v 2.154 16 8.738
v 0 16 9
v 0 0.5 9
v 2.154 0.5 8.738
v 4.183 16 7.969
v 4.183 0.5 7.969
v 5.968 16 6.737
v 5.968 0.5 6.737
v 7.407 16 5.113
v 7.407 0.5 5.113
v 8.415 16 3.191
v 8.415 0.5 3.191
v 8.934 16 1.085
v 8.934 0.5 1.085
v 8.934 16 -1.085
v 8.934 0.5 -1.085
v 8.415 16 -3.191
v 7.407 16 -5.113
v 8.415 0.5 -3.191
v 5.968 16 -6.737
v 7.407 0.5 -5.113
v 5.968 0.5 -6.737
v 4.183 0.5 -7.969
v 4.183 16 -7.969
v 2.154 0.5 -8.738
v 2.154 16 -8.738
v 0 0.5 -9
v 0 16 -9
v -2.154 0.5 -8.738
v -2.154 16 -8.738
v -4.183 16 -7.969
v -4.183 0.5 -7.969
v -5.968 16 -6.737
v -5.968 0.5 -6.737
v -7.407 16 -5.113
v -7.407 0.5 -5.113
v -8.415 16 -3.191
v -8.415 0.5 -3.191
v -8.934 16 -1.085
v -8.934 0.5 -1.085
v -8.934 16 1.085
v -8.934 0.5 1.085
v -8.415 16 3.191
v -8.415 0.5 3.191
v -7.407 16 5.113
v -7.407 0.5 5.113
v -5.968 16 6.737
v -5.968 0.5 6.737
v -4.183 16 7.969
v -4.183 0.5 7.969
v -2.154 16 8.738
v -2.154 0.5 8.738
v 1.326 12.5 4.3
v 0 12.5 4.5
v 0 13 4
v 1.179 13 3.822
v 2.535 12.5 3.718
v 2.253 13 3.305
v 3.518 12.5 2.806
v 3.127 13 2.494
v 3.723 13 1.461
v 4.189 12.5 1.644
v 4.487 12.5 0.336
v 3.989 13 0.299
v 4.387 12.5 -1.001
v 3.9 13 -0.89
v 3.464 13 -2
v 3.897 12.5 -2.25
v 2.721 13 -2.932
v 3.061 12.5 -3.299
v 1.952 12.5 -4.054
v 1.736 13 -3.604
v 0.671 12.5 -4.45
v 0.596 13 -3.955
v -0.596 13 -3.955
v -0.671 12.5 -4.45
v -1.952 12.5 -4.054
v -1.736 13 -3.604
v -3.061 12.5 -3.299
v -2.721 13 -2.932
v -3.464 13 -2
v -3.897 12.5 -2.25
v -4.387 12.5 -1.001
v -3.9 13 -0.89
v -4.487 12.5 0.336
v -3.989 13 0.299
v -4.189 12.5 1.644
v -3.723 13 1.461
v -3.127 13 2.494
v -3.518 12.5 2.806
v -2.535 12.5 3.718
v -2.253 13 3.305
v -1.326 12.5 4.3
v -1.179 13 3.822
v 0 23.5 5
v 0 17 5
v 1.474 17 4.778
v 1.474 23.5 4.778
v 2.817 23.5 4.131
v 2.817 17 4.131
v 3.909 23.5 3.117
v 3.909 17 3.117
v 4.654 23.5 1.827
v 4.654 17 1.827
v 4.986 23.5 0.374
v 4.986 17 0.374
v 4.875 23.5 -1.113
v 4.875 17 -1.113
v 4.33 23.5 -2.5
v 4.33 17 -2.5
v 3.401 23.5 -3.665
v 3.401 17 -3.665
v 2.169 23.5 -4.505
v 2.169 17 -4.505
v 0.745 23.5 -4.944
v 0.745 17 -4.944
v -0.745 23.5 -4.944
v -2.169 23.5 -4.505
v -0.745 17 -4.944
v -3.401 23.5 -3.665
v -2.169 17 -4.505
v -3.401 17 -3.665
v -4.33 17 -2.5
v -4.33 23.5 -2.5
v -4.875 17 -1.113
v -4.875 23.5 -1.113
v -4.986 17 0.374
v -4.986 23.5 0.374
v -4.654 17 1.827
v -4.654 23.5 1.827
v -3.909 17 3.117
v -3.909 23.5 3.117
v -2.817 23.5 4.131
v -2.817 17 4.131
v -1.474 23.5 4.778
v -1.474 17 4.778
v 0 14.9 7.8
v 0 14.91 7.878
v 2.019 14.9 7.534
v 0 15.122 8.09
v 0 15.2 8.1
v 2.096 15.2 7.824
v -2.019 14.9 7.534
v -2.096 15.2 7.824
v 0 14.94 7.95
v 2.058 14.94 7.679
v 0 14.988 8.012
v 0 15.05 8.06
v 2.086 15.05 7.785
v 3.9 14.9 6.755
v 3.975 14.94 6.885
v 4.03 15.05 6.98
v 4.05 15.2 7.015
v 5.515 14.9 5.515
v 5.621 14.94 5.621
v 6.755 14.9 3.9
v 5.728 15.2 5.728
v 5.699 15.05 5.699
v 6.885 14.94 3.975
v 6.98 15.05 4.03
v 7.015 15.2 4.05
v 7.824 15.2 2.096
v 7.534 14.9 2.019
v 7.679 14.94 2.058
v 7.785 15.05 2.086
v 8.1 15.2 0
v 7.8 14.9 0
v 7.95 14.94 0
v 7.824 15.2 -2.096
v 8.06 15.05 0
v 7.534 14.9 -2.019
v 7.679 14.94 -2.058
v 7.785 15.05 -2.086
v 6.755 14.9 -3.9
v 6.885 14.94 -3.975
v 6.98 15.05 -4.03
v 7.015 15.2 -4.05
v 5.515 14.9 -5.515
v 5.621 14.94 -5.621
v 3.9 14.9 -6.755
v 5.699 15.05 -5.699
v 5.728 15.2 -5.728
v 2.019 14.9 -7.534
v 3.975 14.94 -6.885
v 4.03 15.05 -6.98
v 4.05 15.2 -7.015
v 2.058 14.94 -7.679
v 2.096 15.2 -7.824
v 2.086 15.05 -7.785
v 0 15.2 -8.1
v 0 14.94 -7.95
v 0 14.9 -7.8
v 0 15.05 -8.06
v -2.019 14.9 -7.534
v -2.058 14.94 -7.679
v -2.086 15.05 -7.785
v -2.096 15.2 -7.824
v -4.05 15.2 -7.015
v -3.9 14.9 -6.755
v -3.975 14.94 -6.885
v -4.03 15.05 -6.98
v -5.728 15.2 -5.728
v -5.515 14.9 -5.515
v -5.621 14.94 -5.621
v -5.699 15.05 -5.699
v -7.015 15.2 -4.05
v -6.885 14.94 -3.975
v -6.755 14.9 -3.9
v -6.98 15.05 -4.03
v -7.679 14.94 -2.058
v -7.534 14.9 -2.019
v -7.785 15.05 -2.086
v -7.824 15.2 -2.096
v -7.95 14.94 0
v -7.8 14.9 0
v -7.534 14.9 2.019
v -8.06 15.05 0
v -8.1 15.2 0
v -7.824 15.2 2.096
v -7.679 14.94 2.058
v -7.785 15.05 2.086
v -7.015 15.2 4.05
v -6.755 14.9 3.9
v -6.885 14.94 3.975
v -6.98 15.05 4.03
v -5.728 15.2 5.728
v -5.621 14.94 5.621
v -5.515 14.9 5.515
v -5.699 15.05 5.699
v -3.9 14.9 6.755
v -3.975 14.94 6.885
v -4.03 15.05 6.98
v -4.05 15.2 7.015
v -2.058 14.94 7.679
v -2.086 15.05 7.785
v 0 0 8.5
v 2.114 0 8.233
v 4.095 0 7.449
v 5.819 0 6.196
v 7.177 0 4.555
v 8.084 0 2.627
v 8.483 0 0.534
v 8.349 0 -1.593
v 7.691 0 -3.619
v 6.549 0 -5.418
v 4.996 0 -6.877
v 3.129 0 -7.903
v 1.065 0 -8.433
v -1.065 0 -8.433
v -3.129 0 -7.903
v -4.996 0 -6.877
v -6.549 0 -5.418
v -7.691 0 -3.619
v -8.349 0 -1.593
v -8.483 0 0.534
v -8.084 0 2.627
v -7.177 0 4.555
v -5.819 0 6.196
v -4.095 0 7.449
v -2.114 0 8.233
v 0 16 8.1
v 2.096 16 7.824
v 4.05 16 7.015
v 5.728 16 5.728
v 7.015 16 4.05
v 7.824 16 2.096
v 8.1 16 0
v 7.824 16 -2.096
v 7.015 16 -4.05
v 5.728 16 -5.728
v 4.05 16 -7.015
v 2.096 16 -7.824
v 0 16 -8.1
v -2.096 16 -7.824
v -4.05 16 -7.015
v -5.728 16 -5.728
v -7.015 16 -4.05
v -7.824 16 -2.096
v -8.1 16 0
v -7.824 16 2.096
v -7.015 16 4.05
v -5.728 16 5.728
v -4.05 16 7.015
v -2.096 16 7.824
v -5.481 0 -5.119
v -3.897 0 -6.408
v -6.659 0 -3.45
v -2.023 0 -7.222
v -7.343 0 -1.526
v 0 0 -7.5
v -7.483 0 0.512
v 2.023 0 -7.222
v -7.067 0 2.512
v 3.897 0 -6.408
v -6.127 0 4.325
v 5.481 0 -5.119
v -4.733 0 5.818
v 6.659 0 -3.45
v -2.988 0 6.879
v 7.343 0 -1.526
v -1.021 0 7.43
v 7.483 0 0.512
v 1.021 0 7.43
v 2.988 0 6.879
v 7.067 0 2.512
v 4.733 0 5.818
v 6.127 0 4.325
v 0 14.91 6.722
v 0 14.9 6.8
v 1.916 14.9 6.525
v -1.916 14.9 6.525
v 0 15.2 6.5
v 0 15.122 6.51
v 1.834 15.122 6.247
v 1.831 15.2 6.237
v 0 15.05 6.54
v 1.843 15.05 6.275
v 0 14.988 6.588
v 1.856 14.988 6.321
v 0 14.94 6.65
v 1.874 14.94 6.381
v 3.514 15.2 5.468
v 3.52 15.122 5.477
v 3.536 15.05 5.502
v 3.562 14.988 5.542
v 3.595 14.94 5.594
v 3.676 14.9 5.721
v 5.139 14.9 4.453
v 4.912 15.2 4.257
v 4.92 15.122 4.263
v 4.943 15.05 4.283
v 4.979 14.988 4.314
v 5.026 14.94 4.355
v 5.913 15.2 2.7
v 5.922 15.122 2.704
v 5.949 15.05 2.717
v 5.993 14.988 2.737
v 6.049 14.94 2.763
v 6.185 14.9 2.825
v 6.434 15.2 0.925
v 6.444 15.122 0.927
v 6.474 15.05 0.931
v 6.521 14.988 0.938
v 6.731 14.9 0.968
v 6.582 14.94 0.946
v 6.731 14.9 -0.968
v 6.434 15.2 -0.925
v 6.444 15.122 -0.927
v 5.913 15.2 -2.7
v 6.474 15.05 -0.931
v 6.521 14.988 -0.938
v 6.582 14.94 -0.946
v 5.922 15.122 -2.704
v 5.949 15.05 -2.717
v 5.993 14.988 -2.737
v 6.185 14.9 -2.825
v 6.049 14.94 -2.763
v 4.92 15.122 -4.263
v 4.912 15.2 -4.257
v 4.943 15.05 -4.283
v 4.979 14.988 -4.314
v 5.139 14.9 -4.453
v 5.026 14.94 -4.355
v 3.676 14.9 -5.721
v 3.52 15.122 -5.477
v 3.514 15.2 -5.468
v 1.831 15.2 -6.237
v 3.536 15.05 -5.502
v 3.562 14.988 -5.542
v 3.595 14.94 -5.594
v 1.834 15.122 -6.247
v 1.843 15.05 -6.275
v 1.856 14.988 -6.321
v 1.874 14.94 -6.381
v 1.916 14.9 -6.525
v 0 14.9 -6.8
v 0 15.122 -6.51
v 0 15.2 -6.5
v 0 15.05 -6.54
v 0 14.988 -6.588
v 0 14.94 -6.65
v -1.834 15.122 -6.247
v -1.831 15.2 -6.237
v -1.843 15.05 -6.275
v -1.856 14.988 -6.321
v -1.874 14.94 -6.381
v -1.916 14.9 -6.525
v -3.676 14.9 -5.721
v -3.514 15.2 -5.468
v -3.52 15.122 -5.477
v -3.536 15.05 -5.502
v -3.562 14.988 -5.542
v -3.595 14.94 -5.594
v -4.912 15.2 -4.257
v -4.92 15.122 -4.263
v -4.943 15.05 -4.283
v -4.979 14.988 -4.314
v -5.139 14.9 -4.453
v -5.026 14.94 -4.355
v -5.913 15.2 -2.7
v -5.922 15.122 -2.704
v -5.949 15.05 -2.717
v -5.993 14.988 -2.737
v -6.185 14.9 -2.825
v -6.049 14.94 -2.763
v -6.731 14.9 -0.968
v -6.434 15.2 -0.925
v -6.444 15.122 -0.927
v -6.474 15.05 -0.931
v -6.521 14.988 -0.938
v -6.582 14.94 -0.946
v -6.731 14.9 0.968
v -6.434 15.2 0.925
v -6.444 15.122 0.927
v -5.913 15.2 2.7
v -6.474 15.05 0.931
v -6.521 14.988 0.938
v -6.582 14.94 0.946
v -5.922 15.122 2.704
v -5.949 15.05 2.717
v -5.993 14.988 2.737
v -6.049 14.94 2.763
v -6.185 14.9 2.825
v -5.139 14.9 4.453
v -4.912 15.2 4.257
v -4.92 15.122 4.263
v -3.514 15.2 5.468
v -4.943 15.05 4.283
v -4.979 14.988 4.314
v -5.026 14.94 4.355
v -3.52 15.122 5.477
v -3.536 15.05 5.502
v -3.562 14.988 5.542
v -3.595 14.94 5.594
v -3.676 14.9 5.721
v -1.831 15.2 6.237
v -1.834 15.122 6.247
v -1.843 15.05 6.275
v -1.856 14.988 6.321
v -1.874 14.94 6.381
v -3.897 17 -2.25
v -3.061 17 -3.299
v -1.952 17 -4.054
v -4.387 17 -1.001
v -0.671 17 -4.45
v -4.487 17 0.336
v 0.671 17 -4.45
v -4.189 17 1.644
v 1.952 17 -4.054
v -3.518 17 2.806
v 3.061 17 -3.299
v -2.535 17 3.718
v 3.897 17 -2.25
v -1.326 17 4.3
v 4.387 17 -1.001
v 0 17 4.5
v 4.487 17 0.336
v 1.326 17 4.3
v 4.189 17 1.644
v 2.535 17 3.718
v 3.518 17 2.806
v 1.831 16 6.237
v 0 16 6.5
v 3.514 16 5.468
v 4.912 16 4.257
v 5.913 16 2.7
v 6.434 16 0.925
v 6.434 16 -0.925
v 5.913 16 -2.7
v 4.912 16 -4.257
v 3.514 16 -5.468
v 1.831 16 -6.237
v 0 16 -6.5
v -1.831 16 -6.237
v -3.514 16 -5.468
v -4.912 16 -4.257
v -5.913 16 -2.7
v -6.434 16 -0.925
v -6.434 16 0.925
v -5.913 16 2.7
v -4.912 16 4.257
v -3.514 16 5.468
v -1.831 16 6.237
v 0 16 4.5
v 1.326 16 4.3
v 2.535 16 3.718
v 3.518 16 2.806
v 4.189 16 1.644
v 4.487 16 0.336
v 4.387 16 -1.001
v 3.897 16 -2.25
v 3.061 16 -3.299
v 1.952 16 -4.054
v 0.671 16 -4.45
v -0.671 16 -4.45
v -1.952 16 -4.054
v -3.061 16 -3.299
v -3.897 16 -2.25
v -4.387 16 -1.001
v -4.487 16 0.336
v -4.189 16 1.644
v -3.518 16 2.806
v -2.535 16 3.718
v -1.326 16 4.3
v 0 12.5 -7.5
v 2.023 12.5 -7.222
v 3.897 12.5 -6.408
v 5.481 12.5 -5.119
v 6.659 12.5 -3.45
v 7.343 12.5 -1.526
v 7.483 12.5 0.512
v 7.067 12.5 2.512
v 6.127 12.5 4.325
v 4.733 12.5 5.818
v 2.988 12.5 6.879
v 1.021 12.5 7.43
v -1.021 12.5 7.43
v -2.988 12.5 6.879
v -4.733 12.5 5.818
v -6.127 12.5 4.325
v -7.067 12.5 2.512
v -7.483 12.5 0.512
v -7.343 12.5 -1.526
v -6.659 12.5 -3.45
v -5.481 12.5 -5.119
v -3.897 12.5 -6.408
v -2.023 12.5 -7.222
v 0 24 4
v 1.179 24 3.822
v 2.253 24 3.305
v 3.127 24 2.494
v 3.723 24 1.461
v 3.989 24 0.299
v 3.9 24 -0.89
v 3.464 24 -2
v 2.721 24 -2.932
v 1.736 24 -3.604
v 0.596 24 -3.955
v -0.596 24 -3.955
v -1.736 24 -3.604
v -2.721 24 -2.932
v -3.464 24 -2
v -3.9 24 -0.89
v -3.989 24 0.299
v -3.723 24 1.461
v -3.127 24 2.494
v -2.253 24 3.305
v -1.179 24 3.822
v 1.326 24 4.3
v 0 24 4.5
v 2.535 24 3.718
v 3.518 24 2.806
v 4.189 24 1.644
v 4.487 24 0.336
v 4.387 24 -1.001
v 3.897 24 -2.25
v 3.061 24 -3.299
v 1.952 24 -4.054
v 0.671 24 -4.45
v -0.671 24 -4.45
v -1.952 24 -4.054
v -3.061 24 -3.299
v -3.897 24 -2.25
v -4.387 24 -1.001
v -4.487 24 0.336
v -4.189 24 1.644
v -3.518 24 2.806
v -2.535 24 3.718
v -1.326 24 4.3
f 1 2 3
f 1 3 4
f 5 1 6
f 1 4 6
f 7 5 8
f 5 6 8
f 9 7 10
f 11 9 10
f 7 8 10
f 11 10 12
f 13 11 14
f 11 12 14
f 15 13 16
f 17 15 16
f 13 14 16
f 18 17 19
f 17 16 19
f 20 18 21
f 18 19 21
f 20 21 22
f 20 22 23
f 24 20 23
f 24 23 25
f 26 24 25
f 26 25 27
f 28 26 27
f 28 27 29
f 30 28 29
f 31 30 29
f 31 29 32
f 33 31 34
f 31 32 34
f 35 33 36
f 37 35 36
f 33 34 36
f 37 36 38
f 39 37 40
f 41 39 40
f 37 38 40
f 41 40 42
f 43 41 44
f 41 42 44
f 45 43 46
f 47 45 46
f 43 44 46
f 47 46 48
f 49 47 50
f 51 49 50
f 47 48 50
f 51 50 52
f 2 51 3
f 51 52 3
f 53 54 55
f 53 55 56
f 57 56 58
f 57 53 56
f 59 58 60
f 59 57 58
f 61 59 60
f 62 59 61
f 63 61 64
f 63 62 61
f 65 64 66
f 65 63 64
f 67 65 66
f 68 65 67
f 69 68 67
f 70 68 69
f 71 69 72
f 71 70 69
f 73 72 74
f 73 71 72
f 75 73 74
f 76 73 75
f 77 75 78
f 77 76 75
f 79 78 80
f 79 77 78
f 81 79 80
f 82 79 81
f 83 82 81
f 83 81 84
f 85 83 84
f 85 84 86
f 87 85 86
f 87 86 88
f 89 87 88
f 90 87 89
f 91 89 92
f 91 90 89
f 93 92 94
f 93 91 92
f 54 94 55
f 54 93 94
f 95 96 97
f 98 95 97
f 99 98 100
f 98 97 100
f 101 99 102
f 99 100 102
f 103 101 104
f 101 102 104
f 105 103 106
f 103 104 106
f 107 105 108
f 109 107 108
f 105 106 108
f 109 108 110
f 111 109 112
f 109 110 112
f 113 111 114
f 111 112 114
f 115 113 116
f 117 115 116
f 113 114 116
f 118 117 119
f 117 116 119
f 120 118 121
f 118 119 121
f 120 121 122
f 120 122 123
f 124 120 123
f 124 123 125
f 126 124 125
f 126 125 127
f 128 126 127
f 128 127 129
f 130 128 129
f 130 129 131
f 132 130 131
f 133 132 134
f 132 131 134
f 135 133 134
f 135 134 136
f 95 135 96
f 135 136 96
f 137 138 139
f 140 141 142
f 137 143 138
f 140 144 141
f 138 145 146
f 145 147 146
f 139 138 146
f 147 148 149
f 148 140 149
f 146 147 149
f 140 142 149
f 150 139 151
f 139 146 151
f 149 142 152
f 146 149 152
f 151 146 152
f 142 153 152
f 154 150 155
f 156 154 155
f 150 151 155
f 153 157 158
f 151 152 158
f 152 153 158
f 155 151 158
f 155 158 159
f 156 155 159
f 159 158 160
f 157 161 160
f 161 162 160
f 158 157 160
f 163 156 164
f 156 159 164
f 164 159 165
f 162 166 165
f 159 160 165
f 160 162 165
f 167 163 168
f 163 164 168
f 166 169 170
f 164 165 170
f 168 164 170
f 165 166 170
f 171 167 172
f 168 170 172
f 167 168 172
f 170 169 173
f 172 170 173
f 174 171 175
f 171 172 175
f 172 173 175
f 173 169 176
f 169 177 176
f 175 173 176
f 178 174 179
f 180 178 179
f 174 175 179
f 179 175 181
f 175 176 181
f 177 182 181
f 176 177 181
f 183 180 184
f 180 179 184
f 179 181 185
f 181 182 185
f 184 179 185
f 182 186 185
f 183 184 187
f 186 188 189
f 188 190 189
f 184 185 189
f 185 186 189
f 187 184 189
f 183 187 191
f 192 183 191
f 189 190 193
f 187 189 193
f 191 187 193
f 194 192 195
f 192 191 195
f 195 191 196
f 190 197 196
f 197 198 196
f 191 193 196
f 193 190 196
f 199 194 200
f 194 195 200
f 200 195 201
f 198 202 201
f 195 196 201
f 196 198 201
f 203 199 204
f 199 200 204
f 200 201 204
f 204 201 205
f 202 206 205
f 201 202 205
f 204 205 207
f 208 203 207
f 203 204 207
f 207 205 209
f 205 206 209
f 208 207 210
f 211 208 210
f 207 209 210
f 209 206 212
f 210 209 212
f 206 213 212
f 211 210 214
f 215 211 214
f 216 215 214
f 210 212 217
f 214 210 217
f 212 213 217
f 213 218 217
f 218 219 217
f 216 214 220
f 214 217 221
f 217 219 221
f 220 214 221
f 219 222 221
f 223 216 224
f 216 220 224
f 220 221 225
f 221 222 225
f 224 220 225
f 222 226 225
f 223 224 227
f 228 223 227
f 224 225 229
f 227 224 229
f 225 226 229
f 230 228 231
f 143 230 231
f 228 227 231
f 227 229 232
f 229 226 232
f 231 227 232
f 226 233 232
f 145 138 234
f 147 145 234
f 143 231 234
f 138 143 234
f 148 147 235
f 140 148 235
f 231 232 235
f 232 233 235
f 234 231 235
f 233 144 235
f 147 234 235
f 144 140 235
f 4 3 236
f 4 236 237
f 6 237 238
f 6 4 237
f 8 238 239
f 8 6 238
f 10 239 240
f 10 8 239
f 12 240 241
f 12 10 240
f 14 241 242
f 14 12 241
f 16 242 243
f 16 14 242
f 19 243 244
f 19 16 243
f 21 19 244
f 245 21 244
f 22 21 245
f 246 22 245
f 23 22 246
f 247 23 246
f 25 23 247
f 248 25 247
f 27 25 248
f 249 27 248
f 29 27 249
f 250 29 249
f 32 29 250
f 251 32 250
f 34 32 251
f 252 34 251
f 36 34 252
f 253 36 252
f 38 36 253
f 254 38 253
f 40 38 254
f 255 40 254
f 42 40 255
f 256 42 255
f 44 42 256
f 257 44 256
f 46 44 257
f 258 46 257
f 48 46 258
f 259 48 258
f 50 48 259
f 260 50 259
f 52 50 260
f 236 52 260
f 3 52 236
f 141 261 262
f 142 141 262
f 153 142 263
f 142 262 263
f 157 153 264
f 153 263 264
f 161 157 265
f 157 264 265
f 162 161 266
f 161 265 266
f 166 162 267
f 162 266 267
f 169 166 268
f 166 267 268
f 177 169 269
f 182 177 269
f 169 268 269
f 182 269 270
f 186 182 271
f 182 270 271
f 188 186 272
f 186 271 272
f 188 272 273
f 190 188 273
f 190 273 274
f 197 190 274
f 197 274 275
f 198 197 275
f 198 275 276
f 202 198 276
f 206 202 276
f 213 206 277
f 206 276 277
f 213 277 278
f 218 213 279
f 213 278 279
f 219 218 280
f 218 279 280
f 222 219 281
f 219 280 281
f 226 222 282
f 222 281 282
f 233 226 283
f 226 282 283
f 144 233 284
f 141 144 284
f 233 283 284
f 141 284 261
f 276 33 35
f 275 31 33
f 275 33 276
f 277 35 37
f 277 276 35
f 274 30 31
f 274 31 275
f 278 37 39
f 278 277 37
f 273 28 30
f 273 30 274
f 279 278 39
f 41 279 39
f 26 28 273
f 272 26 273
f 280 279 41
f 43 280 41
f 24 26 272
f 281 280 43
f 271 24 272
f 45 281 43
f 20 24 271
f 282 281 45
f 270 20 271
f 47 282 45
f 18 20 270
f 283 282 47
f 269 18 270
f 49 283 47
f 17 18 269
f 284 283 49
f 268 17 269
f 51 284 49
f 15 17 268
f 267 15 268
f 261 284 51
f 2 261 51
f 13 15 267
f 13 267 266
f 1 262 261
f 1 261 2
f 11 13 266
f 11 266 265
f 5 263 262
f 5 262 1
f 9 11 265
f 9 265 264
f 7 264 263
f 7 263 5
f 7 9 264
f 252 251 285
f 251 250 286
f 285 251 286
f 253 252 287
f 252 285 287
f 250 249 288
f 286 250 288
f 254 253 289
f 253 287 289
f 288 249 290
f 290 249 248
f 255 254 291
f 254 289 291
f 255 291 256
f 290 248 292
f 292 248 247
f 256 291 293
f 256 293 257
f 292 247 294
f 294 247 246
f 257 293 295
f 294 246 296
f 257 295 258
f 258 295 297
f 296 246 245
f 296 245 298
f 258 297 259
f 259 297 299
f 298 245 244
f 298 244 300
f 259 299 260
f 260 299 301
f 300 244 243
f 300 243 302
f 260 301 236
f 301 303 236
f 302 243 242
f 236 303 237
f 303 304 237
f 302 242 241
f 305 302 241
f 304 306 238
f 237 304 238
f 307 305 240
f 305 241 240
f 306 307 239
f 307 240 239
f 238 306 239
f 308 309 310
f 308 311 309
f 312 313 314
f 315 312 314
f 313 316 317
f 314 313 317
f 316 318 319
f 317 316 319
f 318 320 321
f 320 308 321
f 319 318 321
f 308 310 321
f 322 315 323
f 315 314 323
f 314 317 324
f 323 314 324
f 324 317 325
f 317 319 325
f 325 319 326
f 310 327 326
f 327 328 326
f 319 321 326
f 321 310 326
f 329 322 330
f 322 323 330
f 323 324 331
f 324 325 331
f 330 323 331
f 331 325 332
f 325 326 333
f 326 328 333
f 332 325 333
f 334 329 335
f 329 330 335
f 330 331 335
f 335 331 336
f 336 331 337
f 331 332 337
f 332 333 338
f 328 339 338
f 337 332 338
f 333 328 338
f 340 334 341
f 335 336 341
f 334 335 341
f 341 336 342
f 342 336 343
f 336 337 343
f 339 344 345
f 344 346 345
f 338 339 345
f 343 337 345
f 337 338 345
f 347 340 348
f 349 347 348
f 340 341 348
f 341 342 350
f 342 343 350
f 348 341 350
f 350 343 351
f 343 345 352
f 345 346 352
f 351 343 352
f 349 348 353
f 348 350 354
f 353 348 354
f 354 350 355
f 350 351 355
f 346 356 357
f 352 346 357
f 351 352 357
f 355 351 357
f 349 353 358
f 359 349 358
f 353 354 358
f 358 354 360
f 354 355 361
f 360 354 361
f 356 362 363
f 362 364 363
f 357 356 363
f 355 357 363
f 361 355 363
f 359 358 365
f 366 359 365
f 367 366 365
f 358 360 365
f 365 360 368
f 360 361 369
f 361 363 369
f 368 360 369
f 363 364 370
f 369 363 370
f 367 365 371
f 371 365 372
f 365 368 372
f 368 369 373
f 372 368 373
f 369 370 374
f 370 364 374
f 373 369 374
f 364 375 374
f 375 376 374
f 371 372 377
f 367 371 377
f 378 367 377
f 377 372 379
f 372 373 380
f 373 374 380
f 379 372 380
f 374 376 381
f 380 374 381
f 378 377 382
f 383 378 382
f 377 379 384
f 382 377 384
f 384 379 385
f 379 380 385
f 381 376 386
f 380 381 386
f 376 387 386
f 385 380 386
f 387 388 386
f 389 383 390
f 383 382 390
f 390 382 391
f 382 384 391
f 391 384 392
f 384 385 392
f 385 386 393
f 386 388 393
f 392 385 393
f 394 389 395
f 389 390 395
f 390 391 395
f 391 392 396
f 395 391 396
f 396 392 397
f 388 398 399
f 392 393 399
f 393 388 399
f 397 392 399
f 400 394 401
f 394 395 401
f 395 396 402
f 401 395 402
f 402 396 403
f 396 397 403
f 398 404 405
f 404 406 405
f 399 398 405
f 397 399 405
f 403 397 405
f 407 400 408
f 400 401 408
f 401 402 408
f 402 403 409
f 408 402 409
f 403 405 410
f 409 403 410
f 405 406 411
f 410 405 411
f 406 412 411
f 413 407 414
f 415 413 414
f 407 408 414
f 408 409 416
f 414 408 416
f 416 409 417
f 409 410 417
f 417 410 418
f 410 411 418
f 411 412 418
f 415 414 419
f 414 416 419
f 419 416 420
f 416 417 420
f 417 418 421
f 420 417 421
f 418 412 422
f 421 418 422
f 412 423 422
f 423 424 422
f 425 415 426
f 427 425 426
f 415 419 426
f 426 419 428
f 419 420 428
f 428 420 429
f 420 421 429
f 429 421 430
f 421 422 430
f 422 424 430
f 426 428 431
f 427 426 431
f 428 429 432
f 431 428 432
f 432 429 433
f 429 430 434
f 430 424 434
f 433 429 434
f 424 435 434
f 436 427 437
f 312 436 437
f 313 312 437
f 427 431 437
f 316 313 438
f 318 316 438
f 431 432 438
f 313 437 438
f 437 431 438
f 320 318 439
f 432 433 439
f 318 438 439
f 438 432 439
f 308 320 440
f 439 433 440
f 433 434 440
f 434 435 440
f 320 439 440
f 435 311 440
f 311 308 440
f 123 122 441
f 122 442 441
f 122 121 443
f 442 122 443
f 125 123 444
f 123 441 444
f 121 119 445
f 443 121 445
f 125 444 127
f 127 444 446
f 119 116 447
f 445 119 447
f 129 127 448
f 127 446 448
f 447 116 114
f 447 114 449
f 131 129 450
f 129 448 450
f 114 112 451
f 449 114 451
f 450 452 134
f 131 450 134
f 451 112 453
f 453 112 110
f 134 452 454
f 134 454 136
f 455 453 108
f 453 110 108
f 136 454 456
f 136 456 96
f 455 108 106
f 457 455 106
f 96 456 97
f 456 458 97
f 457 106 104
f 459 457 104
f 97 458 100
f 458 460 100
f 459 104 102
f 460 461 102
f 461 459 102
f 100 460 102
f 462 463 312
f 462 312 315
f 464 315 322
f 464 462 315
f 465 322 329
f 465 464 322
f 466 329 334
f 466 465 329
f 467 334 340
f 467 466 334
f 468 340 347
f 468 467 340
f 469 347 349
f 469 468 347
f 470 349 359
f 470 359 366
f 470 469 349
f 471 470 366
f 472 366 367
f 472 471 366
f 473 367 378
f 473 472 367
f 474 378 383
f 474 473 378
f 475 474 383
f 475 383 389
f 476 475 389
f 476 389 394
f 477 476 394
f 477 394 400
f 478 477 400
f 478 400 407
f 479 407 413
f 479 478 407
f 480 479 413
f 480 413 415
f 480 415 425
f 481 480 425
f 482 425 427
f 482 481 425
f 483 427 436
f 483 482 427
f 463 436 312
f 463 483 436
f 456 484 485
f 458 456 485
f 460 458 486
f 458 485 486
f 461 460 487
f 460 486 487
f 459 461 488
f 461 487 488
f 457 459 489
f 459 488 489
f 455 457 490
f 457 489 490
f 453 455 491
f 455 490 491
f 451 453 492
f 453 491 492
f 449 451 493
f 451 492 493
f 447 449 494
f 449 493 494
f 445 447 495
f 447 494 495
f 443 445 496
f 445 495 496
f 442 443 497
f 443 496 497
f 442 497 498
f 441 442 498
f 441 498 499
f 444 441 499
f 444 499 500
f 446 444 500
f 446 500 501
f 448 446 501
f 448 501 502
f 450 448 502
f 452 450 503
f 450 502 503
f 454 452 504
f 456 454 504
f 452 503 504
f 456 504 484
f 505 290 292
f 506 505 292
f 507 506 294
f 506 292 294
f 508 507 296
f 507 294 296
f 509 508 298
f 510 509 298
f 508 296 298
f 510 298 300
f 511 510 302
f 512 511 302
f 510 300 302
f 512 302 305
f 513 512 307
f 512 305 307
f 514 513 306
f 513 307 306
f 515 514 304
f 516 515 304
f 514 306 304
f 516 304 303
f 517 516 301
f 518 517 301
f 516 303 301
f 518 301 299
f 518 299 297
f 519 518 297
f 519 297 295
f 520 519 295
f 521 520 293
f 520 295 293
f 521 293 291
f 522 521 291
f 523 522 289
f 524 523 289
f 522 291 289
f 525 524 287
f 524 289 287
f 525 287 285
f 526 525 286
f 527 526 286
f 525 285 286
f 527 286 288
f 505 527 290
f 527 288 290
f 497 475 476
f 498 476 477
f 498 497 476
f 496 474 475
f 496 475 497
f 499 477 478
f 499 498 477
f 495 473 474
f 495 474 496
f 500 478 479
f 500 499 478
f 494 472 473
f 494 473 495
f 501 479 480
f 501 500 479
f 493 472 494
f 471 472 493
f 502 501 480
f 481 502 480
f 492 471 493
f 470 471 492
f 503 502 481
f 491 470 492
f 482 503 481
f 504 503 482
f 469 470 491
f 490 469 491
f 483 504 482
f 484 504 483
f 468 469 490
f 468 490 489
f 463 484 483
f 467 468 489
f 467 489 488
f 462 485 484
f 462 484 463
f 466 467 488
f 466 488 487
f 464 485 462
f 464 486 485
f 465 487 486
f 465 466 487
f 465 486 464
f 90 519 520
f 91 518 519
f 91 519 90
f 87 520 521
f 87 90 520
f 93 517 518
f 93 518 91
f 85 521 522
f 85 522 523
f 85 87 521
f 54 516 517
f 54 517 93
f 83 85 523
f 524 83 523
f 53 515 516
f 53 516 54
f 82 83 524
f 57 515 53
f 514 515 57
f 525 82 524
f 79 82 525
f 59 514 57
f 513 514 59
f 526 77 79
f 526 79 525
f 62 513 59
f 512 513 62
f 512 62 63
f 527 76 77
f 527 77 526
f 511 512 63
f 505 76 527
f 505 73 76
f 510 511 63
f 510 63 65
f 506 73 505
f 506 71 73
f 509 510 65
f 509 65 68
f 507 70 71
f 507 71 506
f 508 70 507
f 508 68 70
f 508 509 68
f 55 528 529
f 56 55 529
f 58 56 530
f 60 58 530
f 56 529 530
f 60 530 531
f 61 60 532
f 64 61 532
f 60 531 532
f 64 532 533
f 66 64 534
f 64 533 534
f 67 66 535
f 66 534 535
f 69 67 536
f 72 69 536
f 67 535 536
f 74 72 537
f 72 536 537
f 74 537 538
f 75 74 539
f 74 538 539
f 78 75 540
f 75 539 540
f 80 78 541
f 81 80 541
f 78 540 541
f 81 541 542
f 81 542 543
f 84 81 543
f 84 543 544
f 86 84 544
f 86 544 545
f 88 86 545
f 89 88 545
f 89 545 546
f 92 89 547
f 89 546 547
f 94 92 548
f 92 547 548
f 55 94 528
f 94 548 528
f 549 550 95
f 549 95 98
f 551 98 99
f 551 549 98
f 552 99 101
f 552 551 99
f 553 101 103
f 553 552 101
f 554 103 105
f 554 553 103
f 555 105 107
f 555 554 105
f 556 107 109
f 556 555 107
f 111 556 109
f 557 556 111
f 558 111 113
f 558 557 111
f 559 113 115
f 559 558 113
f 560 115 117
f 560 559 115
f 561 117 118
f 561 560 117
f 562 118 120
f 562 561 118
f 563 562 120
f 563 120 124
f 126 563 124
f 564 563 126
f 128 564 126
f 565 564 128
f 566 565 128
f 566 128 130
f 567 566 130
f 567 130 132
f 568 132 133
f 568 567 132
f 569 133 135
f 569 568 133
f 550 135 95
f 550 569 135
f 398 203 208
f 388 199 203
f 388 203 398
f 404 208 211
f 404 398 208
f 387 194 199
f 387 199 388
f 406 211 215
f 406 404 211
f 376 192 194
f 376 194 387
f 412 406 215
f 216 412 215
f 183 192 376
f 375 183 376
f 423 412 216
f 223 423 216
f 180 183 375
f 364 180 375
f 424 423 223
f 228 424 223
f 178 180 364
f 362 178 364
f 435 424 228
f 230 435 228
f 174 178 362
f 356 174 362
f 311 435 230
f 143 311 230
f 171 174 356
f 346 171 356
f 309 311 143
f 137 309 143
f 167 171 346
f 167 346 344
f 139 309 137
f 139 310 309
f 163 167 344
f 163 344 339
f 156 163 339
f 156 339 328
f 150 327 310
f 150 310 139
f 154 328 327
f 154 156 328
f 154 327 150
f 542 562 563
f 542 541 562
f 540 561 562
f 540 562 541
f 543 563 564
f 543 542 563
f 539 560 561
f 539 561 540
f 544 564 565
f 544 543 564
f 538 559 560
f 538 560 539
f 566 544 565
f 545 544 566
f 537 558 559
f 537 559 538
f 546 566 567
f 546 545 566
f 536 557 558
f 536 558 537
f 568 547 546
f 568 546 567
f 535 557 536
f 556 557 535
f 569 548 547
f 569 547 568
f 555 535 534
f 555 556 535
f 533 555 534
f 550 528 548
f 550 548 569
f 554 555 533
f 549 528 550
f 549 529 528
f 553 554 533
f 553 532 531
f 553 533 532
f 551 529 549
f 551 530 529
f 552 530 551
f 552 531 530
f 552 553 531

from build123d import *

# Parameters (mm, degrees)
SKETCH_1_R          = 9
EXTRUDE_1_DEPTH     = 16
SKETCH_2_R          = 7.5
CUT_EXTRUDE_1_DEPTH = 12.5
SKETCH_4_R          = 4.5
EXTRUDE_2_DEPTH     = 1
SKETCH_5_R          = 5
EXTRUDE_3_DEPTH     = 7
SKETCH_6_R          = 8.1
SKETCH_6_R_2        = 6.5
CUT_EXTRUDE_2_DEPTH = 1.1
CHAMFER_1_SIZE      = 0.5
FILLET_1_R          = 0.3
SKETCH_15_R         = 4
CUT_EXTRUDE_4_DEPTH = 11.5
CHAMFER_4_SIZE      = 0.5
CHAMFER_5_SIZE      = 0.5


with BuildPart() as part:
    # 草图1 → 凸台-拉伸1 (new body)
    with BuildSketch(Plane(origin=(0, 0, 0), x_dir=(1, 0, 0), z_dir=(0, 1, 0))):
        with Locations(Location((0, 0, 0), (0, 0, 270))):
            Circle(SKETCH_1_R)
    extrude(amount=EXTRUDE_1_DEPTH)

    # 草图2 → 切除-拉伸1 (cut)
    with BuildSketch(Plane.XZ):
        with Locations(Location((0, 0, 0), (0, 0, 270))):
            Circle(SKETCH_2_R)
    extrude(amount=-CUT_EXTRUDE_1_DEPTH, mode=Mode.SUBTRACT)

    # 草图4 → 凸台-拉伸2 (add)
    with BuildSketch(Plane(origin=(0, 16, 0), x_dir=(1, 0, 0), z_dir=(0, 1, 0))):
        with Locations(Location((0, 0, 0), (0, 0, 270))):
            Circle(SKETCH_4_R)
    extrude(amount=EXTRUDE_2_DEPTH)

    # 草图5 → 凸台-拉伸3 (add)
    with BuildSketch(Plane(origin=(0, 17, 0), x_dir=(1, 0, 0), z_dir=(0, 1, 0))):
        with Locations(Location((0, 0, 0), (0, 0, 270))):
            Circle(SKETCH_5_R)
    extrude(amount=EXTRUDE_3_DEPTH)

    # 草图6 → 切除-拉伸2 (cut)
    with BuildSketch(Plane(origin=(0, 16, 0), x_dir=(1, 0, 0), z_dir=(0, 1, 0))):
        with Locations(Location((0, 0, 0), (0, 0, 270))):
            Circle(SKETCH_6_R)
        with Locations(Location((0, 0, 0), (0, 0, 270))):
            Circle(SKETCH_6_R_2, mode=Mode.SUBTRACT)
    extrude(amount=-CUT_EXTRUDE_2_DEPTH, mode=Mode.SUBTRACT)

    # 倒角1
    chamfer_1_edges = [part.edges().sort_by_distance(p)[0] for p in [
        (0, 24, -5),
    ]]
    chamfer(chamfer_1_edges, length=CHAMFER_1_SIZE)

    # 圆角1
    fillet_1_edges = [part.edges().sort_by_distance(p)[0] for p in [
        (0, 14.9, -8.1),
        (0, 14.9, -6.5),
    ]]
    fillet(fillet_1_edges, radius=FILLET_1_R)

    # 草图15 → 切除-拉伸4 (cut)
    with BuildSketch(Plane(origin=(0, 24, 0), x_dir=(1, 0, 0), z_dir=(0, 1, 0))):
        with Locations(Location((0, 0, 0), (0, 0, 270))):
            Circle(SKETCH_15_R)
    extrude(amount=-CUT_EXTRUDE_4_DEPTH, mode=Mode.SUBTRACT)

    # 倒角4
    chamfer_4_edges = [part.edges().sort_by_distance(p)[0] for p in [
        (0, 12.5, -4),
    ]]
    chamfer(chamfer_4_edges, length=CHAMFER_4_SIZE)

    # 倒角5
    chamfer_5_edges = [part.edges().sort_by_distance(p)[0] for p in [
        (0, 0, -9),
    ]]
    chamfer(chamfer_5_edges, length=CHAMFER_5_SIZE)


solid = part.part
